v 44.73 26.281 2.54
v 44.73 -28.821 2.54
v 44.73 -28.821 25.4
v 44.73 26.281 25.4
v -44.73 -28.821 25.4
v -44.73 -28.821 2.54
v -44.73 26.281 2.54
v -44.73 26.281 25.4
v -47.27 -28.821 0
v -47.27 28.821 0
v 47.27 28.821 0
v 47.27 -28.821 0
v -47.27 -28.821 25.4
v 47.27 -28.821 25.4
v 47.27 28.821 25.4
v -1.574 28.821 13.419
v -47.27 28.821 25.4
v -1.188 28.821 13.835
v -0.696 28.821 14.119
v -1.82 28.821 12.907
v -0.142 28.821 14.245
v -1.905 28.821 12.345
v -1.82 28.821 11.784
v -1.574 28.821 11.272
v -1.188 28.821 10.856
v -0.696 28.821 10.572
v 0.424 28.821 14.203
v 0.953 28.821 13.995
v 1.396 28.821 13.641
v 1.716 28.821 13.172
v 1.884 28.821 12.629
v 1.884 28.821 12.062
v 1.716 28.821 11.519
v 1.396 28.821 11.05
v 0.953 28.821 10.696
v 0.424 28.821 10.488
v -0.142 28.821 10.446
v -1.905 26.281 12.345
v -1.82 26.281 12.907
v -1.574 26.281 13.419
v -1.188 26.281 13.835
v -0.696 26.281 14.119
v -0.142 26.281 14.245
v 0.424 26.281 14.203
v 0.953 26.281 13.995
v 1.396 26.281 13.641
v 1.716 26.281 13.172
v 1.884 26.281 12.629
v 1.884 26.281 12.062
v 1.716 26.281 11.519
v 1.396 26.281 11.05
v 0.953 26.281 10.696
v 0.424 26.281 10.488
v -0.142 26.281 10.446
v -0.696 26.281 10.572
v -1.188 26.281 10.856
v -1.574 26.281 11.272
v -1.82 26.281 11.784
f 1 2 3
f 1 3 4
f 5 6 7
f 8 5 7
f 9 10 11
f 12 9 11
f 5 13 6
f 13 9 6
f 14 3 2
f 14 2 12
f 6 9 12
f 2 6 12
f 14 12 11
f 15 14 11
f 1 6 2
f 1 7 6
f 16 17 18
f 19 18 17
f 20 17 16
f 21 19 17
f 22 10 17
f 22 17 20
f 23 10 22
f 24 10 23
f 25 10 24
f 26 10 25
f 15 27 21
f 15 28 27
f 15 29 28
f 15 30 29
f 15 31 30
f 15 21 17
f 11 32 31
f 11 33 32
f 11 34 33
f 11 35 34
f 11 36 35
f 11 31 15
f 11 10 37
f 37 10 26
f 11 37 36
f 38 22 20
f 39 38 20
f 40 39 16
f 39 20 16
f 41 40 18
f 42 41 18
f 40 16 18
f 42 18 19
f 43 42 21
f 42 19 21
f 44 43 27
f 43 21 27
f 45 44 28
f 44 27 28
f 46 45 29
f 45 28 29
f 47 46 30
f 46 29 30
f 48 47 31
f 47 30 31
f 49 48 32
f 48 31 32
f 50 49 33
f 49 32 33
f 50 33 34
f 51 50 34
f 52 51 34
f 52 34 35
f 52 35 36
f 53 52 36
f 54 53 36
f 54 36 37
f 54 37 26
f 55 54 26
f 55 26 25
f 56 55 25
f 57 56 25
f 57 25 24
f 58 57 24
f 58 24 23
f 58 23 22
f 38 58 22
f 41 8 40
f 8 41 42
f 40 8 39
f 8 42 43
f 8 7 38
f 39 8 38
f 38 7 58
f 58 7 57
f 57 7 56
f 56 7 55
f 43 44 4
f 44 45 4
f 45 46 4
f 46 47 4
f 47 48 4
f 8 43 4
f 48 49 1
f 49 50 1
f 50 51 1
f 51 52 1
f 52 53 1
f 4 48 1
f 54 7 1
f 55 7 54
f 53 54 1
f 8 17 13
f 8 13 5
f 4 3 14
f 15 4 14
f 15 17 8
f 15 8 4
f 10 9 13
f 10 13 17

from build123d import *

# Parameters (mm, degrees)
F0_W     = 94.539702
F0_H     = 57.64192
F1_DEPTH = 25.4
F2_T     = -2.54
F4_D     = 3.81


with BuildPart() as f1:
    # F0 (on Top) → F1 (new body)
    with BuildSketch(Plane.XY):
        Rectangle(F0_W, F0_H)
    extrude(amount=F1_DEPTH)

    # F2
    f2_openings = [f1.faces().sort_by_distance(p)[0] for p in [
        (0, 0, 25.4),
        (0, -28.82096, 12.7),
    ]]
    offset(amount=F2_T, openings=f2_openings)

    # F4 (through all)
    with Locations(Plane.XZ.offset(-26.28096)):
        with Locations((0, 12.345429)):
            Hole(F4_D / 2)


solid = f1.part
